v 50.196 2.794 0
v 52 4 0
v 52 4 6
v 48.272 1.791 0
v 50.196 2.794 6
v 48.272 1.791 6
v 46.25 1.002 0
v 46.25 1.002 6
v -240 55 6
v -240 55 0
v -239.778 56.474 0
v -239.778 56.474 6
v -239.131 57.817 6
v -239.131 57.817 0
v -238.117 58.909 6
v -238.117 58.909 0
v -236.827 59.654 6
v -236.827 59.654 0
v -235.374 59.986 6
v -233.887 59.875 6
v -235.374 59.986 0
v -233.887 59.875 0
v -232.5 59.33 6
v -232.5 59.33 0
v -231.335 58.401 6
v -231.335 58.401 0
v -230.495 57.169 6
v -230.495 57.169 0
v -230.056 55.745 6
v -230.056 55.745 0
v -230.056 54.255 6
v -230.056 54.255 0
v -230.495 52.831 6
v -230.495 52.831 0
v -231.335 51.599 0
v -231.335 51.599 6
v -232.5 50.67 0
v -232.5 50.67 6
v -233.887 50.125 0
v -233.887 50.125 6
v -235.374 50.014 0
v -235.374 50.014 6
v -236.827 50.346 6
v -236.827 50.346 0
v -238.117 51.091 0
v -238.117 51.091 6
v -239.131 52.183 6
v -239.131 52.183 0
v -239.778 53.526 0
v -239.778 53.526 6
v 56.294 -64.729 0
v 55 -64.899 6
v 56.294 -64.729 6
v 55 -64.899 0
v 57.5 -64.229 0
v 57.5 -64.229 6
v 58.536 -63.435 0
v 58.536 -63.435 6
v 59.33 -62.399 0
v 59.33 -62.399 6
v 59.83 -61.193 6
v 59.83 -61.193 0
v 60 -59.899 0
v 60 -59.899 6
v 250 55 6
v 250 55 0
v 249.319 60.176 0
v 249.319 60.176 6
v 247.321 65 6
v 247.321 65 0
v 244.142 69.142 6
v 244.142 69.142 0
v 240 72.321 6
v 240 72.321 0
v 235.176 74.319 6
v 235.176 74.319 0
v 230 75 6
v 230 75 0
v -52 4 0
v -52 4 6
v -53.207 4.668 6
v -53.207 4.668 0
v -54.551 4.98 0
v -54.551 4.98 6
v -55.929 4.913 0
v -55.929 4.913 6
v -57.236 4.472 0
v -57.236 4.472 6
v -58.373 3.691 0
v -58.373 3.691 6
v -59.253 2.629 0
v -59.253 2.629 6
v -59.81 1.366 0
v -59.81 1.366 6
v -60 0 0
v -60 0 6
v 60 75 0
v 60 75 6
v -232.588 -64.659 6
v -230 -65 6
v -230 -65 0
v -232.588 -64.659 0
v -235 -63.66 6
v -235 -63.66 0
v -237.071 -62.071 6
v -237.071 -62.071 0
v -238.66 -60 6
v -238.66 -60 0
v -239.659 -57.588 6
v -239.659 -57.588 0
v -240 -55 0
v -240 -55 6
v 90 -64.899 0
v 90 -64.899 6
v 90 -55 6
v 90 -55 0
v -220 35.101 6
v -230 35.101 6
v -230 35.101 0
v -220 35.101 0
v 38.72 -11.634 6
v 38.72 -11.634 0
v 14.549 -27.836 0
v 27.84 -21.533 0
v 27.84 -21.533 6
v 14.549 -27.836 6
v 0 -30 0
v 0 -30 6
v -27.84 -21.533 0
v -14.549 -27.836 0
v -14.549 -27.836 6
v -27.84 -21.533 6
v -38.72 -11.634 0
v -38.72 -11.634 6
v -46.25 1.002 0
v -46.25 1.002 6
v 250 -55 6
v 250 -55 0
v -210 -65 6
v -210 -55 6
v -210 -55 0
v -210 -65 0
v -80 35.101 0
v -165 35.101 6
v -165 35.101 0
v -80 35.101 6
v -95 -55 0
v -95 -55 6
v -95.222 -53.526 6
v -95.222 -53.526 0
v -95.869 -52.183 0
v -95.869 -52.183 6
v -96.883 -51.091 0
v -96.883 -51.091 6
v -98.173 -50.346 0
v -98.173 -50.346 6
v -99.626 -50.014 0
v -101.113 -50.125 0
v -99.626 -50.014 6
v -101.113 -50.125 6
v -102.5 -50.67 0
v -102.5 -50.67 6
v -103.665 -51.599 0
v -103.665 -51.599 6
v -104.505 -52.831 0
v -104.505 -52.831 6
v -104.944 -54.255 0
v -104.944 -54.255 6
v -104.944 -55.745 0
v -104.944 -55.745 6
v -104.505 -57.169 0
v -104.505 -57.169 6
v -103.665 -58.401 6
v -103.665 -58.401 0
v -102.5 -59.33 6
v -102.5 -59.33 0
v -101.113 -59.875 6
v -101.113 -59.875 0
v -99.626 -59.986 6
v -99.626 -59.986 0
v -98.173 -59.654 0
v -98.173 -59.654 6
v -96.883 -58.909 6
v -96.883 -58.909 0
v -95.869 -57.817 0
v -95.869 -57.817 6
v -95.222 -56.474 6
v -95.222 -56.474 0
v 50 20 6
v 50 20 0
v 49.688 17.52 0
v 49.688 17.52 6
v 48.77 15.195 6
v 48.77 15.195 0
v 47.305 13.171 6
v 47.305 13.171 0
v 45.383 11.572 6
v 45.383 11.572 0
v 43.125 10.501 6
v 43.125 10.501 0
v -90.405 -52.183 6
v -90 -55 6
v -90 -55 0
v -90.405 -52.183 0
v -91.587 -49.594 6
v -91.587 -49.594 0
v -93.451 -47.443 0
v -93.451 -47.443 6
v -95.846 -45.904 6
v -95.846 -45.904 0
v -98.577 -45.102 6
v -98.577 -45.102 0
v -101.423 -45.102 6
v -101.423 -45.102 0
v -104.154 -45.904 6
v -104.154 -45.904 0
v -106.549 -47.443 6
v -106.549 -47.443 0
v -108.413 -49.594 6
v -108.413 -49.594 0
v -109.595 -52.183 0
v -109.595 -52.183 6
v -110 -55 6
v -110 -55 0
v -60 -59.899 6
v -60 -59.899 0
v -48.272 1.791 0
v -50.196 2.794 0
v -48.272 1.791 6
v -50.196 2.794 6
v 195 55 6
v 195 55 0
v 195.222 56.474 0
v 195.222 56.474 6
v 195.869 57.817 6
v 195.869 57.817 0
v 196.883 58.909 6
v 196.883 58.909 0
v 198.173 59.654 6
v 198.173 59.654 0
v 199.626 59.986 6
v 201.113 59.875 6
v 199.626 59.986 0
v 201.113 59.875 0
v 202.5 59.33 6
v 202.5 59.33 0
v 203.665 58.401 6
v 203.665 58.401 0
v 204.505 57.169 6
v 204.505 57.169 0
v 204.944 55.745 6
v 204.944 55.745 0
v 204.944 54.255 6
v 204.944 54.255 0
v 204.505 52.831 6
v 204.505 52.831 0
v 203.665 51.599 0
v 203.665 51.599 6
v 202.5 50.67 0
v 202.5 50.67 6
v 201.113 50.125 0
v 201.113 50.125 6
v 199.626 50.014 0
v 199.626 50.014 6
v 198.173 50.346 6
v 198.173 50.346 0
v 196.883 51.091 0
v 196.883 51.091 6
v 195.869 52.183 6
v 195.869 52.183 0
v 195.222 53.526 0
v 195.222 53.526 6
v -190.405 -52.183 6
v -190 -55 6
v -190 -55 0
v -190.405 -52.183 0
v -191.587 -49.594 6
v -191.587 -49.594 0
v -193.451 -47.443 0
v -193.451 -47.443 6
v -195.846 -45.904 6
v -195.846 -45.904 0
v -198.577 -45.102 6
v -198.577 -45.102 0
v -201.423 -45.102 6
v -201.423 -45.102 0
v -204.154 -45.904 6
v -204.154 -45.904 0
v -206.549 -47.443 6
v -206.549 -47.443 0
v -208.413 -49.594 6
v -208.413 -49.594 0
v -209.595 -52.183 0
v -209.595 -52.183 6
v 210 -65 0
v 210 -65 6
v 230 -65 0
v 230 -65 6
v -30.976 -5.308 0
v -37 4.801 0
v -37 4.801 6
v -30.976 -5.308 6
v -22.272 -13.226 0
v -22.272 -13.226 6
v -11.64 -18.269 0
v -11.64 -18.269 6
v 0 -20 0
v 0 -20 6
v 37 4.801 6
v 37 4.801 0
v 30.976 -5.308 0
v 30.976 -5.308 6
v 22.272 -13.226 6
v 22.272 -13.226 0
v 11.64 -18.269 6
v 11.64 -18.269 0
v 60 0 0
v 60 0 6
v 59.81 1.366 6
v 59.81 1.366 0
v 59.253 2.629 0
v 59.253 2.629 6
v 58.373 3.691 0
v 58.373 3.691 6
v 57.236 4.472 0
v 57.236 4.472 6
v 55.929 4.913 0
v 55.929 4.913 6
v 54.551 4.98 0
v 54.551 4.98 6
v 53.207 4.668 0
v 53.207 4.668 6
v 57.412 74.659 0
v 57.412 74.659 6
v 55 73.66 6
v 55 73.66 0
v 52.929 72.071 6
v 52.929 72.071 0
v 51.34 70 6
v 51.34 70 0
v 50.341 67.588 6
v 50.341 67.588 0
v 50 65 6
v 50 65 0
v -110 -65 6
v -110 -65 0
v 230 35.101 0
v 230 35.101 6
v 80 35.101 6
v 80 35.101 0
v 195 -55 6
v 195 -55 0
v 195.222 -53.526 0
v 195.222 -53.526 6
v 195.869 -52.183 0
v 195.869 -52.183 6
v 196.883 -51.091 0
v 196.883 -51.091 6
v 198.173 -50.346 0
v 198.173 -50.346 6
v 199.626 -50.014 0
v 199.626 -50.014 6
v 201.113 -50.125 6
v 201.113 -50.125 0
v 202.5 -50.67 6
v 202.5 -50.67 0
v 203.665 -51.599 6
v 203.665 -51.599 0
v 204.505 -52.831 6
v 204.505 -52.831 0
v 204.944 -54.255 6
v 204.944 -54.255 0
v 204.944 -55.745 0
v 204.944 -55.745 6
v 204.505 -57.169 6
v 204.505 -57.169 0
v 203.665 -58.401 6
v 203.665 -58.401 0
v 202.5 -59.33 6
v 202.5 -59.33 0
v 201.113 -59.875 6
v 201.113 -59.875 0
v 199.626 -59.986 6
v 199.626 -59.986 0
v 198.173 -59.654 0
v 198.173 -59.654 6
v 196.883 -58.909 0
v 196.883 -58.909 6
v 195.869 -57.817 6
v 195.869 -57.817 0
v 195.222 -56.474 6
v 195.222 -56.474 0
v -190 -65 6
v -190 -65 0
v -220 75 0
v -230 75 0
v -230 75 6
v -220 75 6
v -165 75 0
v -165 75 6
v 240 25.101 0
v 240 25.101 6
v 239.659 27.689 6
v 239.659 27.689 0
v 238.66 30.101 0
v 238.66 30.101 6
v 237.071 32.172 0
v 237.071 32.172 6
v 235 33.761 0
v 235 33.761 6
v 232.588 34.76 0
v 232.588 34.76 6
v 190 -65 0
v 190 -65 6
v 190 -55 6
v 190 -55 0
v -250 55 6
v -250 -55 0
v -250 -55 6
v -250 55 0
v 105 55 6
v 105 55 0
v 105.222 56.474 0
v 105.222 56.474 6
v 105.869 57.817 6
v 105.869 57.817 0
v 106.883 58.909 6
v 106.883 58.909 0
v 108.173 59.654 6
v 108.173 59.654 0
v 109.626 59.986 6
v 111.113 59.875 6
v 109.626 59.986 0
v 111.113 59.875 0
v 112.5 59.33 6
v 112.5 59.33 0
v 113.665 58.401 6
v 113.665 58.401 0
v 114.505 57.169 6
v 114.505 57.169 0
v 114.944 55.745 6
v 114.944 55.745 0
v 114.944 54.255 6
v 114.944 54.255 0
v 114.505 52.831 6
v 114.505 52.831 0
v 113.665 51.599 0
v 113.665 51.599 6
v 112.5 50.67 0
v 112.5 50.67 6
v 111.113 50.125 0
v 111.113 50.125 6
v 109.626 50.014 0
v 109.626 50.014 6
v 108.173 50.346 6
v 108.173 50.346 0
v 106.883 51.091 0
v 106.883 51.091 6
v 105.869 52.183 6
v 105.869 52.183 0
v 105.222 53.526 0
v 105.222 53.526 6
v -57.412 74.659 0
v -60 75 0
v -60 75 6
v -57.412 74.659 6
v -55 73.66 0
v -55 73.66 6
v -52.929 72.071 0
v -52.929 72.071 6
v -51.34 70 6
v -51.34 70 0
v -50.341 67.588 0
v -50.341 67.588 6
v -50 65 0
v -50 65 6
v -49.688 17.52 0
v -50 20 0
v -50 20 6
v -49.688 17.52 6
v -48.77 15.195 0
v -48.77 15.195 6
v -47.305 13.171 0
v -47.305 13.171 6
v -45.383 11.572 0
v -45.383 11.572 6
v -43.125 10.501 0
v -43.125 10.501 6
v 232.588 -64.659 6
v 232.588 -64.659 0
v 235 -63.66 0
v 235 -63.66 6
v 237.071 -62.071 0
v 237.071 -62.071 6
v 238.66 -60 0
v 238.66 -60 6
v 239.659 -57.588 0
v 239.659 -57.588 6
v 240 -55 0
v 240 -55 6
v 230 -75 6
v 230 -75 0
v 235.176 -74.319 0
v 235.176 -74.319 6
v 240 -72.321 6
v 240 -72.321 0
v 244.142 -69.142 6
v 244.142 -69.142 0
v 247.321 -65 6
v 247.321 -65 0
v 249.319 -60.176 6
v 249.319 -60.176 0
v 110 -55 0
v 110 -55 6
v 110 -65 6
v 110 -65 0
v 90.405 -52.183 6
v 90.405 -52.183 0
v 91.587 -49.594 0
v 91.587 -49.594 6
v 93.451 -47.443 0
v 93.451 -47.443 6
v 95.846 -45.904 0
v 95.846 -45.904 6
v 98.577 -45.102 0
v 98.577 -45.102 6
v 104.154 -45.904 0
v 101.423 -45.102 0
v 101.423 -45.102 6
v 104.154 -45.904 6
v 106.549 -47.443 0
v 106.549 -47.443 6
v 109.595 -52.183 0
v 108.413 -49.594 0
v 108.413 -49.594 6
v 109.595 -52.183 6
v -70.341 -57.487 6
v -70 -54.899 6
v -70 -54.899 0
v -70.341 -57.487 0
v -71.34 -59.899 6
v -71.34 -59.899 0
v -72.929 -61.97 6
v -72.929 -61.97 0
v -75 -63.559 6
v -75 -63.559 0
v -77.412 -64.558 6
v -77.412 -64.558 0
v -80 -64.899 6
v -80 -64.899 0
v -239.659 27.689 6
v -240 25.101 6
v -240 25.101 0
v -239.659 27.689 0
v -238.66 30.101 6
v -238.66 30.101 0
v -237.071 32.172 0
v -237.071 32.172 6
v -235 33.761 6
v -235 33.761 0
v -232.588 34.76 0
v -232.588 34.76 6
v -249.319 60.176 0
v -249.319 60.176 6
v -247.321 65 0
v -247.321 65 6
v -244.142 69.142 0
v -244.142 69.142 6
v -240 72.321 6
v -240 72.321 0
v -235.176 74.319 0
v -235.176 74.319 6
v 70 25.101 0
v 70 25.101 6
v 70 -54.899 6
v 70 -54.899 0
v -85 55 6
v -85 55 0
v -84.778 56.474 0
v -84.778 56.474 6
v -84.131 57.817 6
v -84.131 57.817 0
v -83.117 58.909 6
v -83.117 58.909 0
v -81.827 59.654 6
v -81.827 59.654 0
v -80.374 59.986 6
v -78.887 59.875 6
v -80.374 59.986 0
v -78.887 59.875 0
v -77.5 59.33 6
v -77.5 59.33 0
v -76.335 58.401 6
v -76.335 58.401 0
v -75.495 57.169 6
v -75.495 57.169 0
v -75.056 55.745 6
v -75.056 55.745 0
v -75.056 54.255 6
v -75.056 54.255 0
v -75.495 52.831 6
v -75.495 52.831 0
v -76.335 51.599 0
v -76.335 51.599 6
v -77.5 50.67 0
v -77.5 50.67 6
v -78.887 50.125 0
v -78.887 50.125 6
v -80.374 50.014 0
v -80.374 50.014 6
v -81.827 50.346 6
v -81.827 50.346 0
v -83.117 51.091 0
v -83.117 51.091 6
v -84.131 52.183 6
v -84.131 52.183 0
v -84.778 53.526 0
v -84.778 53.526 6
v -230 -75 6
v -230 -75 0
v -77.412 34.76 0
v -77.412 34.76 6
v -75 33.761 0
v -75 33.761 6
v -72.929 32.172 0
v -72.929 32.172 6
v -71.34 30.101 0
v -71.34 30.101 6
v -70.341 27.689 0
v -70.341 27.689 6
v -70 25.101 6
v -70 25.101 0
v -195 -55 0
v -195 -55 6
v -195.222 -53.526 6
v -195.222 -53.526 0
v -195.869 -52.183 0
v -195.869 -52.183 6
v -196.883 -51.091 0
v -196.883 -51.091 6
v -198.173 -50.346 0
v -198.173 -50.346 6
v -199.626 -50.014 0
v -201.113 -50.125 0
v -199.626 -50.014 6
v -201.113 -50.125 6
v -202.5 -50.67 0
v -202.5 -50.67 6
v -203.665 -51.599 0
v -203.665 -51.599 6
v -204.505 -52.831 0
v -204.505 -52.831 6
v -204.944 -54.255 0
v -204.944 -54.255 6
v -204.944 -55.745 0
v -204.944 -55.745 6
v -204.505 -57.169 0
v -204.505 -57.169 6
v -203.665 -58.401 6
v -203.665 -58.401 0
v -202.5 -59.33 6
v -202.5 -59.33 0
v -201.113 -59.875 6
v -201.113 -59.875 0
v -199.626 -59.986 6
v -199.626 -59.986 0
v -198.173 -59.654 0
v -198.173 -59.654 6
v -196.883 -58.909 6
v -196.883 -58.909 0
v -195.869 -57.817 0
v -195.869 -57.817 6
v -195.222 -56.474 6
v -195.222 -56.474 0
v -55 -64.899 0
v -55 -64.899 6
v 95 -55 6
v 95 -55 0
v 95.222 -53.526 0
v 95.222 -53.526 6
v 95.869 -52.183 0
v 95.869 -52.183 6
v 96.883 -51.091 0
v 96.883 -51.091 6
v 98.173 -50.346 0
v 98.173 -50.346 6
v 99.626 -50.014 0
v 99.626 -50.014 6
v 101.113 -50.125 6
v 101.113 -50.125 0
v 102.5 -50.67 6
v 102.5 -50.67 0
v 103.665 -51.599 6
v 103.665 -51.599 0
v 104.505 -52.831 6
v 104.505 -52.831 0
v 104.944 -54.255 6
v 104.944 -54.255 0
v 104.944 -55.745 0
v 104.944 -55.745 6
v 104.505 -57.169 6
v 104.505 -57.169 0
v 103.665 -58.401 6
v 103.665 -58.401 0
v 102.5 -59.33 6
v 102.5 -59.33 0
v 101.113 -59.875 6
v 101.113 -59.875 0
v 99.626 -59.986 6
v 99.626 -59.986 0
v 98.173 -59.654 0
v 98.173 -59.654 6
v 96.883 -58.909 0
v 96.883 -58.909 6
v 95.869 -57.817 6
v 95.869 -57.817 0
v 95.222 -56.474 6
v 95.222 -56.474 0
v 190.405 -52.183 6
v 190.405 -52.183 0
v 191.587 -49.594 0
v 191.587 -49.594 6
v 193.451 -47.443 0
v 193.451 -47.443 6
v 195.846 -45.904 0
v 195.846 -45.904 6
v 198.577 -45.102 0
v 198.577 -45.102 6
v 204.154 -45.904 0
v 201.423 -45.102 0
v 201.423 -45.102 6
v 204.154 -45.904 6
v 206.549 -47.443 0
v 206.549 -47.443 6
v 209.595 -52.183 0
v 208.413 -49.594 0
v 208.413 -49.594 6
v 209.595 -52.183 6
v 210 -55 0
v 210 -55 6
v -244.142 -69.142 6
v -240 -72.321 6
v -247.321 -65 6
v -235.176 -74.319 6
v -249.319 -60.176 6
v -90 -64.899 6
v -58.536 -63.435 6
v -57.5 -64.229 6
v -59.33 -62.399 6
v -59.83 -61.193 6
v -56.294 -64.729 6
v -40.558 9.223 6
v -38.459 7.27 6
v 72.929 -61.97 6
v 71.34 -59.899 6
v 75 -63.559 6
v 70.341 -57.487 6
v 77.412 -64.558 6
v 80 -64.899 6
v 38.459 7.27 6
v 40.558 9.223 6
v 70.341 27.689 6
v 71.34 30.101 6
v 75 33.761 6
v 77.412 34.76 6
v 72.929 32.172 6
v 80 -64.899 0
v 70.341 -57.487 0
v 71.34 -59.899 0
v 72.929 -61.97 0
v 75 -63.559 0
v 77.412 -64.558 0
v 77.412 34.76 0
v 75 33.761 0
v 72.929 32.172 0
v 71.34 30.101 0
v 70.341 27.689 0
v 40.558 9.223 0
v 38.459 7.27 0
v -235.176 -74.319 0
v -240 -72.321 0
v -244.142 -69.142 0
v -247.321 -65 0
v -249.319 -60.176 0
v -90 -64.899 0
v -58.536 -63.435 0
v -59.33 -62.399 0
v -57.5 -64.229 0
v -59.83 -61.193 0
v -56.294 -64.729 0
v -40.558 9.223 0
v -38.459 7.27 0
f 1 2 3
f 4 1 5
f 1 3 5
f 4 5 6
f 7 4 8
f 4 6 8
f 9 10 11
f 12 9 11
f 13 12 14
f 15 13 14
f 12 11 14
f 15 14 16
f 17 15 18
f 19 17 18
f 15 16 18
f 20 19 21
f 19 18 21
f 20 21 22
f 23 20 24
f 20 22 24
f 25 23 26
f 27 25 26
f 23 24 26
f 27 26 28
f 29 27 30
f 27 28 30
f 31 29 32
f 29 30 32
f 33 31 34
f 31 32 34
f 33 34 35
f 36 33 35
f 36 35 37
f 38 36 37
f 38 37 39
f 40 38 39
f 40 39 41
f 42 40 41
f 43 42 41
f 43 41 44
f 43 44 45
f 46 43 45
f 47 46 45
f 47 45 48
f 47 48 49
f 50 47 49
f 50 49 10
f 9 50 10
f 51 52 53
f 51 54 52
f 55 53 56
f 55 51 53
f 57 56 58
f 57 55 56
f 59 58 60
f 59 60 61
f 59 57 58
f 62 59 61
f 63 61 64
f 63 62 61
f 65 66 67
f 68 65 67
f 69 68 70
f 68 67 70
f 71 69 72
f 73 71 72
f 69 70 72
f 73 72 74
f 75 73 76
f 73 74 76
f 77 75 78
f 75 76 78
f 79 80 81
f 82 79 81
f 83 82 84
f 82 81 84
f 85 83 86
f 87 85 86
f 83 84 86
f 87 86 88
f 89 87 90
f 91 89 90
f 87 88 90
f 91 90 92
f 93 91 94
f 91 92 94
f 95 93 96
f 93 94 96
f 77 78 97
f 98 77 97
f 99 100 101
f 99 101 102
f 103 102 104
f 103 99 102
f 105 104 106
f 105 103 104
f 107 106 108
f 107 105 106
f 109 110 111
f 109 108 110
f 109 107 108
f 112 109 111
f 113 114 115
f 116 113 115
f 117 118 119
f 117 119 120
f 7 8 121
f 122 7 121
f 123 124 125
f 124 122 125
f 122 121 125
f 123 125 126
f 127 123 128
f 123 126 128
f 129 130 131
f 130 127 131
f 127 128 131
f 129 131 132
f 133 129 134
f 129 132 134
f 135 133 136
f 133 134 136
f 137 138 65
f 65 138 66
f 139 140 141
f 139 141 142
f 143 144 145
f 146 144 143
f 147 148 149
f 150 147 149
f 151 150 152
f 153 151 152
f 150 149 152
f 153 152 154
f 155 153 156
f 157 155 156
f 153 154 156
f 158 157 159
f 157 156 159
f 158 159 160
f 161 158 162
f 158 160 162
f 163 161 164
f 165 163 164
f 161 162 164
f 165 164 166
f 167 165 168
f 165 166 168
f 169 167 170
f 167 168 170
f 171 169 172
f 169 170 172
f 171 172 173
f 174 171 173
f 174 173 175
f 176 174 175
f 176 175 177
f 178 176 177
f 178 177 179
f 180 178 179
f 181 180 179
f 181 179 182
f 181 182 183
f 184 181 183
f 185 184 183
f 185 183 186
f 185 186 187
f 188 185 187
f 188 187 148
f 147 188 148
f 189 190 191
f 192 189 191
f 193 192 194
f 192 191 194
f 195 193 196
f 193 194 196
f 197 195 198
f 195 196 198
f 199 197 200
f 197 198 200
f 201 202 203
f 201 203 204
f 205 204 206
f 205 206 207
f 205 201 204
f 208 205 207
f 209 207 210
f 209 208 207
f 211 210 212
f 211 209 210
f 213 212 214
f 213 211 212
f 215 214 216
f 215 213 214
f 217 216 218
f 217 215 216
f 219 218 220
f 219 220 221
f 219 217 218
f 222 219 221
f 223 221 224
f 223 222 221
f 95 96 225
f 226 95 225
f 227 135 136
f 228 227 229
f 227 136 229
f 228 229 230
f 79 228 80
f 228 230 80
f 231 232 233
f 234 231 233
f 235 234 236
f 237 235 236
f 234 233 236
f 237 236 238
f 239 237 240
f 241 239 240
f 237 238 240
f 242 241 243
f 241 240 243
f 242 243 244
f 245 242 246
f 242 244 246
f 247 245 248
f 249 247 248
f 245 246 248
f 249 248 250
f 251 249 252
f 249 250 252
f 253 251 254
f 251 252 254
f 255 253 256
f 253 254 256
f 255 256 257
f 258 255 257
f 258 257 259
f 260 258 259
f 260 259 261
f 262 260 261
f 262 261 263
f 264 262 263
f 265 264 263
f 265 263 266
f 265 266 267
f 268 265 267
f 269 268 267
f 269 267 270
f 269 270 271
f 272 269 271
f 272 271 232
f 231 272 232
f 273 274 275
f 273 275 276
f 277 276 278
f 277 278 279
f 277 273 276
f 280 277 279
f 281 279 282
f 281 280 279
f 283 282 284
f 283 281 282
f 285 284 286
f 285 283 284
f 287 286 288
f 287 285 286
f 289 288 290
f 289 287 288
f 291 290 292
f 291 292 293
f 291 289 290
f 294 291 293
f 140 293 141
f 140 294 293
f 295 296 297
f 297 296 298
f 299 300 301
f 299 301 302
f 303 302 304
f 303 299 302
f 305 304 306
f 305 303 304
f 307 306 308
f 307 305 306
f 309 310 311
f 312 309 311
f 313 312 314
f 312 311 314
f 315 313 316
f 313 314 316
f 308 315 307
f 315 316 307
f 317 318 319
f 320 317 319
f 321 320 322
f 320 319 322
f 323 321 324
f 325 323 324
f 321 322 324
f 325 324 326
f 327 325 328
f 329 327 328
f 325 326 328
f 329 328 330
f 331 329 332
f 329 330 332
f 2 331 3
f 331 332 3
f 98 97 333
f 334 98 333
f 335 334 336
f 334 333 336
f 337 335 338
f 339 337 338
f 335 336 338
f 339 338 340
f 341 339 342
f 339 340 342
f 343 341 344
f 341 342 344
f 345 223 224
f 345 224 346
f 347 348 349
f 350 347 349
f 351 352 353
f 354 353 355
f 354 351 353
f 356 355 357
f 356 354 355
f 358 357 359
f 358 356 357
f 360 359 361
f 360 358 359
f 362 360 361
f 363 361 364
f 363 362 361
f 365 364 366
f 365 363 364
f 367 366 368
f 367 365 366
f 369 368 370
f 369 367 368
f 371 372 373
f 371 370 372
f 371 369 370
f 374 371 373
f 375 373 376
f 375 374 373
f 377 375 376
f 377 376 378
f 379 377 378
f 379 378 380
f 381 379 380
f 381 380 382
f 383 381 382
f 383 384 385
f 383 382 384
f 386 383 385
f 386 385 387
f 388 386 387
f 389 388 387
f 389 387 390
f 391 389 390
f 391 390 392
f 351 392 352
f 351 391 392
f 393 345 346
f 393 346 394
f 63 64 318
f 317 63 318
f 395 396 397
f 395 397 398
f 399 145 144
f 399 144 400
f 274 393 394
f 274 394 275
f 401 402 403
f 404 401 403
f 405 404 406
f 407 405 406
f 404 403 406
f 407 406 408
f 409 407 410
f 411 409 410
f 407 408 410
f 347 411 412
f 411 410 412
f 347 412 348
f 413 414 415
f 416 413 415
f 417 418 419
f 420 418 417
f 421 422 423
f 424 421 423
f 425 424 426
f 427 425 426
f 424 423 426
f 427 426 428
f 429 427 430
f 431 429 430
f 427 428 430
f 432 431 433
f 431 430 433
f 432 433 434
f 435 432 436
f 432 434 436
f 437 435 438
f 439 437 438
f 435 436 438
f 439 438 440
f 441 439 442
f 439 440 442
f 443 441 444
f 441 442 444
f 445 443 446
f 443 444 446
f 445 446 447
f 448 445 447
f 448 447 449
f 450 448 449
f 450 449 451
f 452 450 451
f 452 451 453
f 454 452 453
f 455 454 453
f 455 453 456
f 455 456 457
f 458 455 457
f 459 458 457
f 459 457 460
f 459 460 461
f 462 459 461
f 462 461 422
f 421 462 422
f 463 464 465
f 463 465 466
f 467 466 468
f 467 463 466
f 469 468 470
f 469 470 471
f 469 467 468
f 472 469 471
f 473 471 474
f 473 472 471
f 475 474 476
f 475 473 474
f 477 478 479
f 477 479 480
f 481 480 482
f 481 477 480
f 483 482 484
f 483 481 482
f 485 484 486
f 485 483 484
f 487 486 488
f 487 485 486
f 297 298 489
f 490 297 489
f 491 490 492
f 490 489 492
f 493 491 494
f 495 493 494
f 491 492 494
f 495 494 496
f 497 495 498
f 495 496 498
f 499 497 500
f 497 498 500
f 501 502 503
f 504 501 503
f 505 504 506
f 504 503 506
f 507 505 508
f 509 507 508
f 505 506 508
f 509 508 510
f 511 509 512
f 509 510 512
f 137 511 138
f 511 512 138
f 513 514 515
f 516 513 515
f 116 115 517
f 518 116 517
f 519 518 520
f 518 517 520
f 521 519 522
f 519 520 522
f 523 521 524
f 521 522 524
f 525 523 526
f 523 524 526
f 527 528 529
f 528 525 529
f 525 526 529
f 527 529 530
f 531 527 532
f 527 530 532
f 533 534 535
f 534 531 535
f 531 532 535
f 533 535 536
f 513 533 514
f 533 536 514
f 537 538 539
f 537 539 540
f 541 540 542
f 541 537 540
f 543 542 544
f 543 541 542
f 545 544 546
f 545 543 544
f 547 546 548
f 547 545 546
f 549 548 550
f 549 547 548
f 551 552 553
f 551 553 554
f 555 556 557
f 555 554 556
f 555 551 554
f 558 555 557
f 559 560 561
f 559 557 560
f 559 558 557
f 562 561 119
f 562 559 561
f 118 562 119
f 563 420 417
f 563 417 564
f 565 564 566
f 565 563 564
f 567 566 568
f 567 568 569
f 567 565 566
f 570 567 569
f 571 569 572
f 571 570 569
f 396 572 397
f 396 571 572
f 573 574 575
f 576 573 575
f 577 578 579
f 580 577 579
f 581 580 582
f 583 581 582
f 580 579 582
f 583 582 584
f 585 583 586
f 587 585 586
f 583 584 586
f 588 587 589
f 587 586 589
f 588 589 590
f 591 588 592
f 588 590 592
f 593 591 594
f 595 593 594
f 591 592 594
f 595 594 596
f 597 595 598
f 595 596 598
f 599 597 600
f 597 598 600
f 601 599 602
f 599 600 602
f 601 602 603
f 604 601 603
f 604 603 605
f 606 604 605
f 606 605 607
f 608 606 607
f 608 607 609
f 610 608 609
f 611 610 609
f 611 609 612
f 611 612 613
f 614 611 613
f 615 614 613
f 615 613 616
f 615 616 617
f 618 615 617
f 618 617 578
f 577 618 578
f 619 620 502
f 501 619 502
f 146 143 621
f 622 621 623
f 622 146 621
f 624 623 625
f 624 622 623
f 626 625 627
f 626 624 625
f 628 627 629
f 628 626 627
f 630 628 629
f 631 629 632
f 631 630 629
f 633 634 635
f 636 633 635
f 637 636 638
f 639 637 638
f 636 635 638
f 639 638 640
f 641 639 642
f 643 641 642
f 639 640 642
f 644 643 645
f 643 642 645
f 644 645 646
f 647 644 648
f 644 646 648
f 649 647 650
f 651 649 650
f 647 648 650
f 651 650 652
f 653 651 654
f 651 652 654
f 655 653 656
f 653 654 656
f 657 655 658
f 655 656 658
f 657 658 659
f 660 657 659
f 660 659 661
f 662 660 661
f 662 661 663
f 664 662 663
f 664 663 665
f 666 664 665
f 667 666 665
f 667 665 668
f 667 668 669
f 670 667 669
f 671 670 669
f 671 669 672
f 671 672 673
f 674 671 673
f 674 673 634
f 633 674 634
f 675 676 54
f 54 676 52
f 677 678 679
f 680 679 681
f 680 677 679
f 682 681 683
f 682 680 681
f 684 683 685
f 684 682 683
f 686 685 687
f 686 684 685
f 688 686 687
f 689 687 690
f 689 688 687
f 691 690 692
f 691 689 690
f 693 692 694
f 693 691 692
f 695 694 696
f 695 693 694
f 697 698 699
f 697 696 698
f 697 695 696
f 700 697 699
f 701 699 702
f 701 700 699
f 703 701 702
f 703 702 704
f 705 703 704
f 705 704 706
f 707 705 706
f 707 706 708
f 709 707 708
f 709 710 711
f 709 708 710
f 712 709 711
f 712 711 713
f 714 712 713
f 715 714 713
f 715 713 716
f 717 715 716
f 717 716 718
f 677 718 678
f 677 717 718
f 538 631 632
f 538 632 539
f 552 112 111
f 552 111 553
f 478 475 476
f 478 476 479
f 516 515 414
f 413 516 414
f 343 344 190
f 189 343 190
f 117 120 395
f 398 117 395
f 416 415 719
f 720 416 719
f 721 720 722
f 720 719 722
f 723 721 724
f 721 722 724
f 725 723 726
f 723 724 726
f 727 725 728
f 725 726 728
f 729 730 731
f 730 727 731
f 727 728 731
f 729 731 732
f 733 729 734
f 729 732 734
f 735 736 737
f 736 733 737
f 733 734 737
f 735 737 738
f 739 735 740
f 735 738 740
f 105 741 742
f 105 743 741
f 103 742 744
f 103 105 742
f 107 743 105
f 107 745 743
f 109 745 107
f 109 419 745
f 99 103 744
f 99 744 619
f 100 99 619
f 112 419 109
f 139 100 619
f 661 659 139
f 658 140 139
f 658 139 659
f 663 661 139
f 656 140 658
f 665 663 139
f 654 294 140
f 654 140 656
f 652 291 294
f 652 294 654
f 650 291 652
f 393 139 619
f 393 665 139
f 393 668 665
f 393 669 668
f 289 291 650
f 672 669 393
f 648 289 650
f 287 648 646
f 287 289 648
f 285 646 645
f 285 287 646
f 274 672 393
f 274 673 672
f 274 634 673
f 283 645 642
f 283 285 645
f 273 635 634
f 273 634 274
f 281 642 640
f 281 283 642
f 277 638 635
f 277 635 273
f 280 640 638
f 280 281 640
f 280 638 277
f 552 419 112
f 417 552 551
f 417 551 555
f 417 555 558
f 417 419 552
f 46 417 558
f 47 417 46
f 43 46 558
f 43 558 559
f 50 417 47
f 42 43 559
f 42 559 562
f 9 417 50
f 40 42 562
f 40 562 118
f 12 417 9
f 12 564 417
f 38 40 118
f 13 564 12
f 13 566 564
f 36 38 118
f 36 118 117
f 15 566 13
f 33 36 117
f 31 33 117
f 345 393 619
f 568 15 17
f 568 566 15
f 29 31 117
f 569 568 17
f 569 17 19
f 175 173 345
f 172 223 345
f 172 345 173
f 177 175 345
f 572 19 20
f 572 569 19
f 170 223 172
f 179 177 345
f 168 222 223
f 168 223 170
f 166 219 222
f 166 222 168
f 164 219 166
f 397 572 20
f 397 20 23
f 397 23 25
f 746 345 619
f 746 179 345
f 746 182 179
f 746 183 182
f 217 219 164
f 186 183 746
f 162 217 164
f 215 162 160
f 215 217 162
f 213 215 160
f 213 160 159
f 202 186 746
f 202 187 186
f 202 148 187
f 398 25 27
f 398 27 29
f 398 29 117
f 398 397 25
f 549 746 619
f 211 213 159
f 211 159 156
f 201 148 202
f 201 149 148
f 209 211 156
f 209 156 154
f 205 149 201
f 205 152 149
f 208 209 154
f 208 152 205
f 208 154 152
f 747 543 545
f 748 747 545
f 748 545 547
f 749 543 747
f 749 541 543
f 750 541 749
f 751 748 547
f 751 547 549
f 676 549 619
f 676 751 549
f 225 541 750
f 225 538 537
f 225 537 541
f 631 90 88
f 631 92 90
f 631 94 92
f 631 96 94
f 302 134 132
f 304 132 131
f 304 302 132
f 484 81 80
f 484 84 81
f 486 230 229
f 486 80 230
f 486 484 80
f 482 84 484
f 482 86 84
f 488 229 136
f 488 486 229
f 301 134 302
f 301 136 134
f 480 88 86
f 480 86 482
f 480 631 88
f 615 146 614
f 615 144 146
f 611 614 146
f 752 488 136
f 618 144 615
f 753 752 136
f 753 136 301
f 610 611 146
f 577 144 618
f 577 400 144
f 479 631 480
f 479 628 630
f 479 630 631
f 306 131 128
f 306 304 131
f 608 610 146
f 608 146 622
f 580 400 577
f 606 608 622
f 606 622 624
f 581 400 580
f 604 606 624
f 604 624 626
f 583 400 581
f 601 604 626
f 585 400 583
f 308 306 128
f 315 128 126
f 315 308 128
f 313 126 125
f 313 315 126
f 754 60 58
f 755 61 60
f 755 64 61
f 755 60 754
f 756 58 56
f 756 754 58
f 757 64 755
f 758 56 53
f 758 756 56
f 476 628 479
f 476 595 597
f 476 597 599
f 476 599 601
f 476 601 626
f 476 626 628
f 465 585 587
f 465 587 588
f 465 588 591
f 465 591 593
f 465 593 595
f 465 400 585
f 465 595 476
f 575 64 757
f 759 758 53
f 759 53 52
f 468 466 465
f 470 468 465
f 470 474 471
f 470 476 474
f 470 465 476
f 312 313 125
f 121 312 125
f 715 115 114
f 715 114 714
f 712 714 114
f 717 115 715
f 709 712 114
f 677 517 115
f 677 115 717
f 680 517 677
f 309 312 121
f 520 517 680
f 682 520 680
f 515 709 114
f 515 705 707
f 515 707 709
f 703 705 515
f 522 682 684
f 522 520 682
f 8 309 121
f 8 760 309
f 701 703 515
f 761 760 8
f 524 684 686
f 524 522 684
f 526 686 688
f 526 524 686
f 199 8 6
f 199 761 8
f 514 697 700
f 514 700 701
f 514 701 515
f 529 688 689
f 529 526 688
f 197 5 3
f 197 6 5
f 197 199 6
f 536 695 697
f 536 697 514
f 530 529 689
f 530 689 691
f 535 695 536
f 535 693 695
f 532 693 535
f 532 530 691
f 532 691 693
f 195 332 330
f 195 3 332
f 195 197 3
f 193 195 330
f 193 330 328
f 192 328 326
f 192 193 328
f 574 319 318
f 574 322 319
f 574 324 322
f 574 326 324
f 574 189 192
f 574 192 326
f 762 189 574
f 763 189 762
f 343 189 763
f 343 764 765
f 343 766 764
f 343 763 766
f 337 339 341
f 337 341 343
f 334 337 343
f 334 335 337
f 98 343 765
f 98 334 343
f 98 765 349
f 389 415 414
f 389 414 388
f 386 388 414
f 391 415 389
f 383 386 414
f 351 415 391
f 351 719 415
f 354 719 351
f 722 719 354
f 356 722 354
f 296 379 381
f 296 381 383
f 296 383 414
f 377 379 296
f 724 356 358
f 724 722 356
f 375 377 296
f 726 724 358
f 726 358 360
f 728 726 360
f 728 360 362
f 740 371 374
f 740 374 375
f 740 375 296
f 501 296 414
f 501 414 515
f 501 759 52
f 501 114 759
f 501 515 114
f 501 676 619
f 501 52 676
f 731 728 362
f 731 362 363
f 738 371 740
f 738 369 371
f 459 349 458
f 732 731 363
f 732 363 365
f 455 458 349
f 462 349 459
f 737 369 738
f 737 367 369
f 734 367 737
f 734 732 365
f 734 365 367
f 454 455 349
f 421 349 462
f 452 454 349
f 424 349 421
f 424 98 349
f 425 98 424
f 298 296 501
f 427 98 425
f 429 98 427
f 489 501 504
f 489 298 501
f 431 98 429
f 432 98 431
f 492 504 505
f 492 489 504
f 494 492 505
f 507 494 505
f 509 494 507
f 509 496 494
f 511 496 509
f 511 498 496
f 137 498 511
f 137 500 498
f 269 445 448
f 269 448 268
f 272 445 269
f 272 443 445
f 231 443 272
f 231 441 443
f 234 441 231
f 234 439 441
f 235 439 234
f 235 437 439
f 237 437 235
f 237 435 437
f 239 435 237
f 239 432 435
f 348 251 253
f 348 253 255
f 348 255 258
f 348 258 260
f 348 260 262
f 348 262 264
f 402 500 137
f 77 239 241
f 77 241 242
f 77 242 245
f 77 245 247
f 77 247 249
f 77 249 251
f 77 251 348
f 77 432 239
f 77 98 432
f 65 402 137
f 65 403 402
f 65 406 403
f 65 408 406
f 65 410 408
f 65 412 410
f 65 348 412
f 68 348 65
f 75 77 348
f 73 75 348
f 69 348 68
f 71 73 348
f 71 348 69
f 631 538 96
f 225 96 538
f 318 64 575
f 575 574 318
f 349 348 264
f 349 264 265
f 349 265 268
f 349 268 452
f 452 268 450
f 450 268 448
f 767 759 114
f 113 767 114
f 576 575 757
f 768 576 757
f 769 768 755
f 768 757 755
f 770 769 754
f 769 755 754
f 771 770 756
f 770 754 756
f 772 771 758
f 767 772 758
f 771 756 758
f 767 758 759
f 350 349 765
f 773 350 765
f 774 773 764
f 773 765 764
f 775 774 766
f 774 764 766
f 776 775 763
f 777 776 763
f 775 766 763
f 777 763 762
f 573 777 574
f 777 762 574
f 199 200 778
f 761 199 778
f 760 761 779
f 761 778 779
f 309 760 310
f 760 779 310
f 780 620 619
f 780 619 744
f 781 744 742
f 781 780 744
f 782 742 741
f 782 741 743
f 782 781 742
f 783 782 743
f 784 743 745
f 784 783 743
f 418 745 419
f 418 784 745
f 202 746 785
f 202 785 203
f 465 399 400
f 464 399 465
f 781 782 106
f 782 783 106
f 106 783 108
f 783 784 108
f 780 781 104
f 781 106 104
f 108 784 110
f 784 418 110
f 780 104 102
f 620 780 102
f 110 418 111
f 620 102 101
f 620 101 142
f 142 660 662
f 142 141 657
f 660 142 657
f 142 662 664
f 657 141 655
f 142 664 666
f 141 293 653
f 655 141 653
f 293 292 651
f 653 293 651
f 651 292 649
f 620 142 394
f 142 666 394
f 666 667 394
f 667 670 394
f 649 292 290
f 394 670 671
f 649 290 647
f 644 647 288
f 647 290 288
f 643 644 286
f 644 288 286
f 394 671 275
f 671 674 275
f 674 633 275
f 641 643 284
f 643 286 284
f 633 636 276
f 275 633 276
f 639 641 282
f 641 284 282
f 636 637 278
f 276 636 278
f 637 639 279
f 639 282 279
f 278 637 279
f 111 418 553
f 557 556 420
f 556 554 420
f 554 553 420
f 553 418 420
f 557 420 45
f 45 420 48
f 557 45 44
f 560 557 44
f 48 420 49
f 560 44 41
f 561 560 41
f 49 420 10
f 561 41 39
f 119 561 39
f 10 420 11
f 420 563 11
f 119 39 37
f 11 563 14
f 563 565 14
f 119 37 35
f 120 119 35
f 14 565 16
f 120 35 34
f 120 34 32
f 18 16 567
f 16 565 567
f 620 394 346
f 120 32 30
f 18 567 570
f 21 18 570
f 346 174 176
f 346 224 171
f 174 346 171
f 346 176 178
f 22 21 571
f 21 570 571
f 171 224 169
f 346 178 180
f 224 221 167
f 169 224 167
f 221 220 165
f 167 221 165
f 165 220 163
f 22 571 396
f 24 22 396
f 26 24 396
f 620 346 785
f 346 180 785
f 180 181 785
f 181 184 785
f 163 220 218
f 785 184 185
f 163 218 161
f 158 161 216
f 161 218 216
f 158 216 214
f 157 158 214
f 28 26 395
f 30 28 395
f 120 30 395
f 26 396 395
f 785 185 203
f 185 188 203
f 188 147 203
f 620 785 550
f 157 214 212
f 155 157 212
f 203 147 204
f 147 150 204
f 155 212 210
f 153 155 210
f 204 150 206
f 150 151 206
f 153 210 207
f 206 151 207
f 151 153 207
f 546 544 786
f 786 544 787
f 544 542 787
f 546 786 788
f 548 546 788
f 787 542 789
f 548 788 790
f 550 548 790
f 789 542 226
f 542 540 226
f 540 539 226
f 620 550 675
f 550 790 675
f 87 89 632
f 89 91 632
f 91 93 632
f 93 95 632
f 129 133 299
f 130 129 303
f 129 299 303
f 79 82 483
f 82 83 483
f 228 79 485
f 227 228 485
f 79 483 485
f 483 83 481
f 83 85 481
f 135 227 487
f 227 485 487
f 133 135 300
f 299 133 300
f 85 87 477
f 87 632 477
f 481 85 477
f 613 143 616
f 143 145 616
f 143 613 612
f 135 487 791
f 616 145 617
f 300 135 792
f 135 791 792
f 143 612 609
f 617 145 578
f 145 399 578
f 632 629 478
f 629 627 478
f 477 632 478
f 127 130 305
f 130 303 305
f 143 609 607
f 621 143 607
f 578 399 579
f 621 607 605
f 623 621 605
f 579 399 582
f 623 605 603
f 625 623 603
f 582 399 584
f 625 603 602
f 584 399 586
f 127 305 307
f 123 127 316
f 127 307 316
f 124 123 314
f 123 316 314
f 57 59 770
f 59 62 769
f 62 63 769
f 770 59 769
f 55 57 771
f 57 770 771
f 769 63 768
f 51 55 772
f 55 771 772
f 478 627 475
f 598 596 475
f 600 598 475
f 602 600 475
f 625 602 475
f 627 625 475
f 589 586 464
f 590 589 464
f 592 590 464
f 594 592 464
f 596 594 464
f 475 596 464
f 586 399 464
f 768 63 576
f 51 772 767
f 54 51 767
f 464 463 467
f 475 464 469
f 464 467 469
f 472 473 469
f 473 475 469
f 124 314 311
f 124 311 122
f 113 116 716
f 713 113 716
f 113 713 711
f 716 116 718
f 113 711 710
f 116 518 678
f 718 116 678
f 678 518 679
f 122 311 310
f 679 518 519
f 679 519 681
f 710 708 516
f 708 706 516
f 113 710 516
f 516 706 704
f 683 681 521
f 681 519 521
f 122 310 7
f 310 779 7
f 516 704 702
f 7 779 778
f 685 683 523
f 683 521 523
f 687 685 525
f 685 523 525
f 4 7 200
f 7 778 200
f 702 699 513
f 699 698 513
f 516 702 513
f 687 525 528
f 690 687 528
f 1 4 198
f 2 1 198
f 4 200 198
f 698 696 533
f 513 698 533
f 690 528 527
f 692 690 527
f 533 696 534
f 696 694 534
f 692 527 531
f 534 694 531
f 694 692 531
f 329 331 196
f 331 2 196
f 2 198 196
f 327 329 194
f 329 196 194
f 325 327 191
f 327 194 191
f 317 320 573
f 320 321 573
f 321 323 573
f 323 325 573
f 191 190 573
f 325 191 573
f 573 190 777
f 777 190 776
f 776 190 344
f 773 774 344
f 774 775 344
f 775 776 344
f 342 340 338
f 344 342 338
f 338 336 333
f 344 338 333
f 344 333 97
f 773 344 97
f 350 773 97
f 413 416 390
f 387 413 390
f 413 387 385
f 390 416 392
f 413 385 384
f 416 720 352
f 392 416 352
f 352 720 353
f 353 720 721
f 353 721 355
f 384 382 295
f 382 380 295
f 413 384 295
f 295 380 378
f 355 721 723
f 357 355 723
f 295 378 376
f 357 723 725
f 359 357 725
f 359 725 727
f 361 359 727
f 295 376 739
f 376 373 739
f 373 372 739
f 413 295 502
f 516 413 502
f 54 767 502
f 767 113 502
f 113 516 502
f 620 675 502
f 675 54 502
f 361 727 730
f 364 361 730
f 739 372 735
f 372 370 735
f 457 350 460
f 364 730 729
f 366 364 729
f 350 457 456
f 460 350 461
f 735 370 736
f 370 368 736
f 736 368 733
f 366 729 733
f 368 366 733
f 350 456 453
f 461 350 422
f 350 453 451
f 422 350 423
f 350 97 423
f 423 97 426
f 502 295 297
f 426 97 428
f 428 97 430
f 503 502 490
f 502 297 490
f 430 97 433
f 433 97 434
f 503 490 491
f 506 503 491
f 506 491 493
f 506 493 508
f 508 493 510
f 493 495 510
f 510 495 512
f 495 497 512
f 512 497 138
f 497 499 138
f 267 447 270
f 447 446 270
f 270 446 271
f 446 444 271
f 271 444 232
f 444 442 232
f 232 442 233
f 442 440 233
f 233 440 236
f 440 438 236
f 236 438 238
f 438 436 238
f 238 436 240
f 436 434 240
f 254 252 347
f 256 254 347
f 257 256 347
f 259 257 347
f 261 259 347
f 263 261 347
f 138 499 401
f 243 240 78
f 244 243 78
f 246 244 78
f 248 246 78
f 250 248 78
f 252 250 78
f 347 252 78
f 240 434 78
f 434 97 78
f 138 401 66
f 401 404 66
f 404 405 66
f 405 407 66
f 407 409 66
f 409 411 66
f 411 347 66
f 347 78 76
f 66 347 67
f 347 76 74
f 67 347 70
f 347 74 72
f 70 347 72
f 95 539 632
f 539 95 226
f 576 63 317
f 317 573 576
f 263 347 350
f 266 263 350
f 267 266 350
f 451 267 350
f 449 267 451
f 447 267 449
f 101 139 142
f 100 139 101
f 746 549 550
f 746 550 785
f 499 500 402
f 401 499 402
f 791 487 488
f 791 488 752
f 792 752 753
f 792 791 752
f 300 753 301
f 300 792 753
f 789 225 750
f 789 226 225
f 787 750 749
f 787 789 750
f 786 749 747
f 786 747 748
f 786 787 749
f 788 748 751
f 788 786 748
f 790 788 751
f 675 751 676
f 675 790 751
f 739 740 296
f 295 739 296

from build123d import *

# Parameters (mm, degrees)
BOSS_EXTRUDE1_DEPTH = 6
SKETCH4_R           = 5
CUT_EXTRUDE2_DEPTH  = 262.076617107
CUT_EXTRUDE5_DEPTH  = 262.076617107
FILLET5_R           = 5
FILLET6_R           = 5
SKETCH9_R           = 5
SKETCH9_W           = 55
SKETCH9_H           = 39.899020921
CUT_EXTRUDE6_DEPTH  = 262.076617107


with BuildPart() as part:
    # Sketch1 → Boss-Extrude1 (new body)
    with BuildSketch(Plane.XY):
        with BuildLine():
            Line((-250, -55), (-250, 3.178280867))
            Line((-250, 3.178280867), (-250, 55))
            ThreePointArc((-250, 55), (-244.142135624, 69.142135624), (-230, 75))
            Line((-230, 75), (-220, 75))
            Line((-220, 75), (-164.330865428, 75))
            Line((-164.330865428, 75), (-60, 75))
            ThreePointArc((-60, 75), (-52.928932188, 72.071067812), (-50, 65))
            Line((-50, 65), (-50, 20))
            ThreePointArc((-50, 20), (-48.100925873, 14.1369803), (-43.125, 10.500822404))
            ThreePointArc((-43.125, 10.500822404), (-39.437786703, 8.32242004), (-37, 4.801315846))
            ThreePointArc((-37, 4.801315846), (-22.271648276, -13.226099426), (0, -20))
            Line((0, -20), (0, -40))
            Line((0, -40), (0, -65))
            Line((0, -65), (0, -75))
            Line((0, -75), (-230, -75))
            ThreePointArc((-230, -75), (-244.142135624, -69.142135624), (-250, -55))
        make_face()
    boss_extrude1 = extrude(amount=BOSS_EXTRUDE1_DEPTH)

    # Mirror1: Boss-Extrude1 across plane
    add(boss_extrude1.mirror(Plane(origin=(0, -20, 6), x_dir=(0, 0, 1), z_dir=(-1, 0, 0))))

    # Sketch4 → Cut-Extrude2 (cut, through all)
    with BuildSketch(Plane.XY.offset(6)):
        with Locations((-200, -55)):
            Circle(SKETCH4_R)
        with Locations((-100, -55)):
            Circle(SKETCH4_R)
        with BuildLine():
            Line((-70, 25.100979079), (-70, -54.899020921))
            ThreePointArc((-70, -54.899020921), (-72.928932188, -61.970088733), (-80, -64.899020921))
            Line((-80, -64.899020921), (-90, -64.899020921))
            Line((-90, -64.899020921), (-90, -55))
            ThreePointArc((-90, -55), (-100, -45), (-110, -55))
            Line((-110, -55), (-110, -65))
            Line((-110, -65), (-190, -65))
            Line((-190, -65), (-190, -55))
            ThreePointArc((-190, -55), (-200, -45), (-210, -55))
            Line((-210, -55), (-210, -65))
            Line((-210, -65), (-230, -65))
            ThreePointArc((-230, -65), (-237.071067812, -62.071067812), (-240, -55))
            Line((-240, -55), (-240, 25.100979079))
            ThreePointArc((-240, 25.100979079), (-237.071067812, 32.17204689), (-230, 35.100979079))
            Line((-230, 35.100979079), (-140, 35.100979079))
            Line((-140, 35.100979079), (-110, 35.100979079))
            Line((-110, 35.100979079), (-80, 35.100979079))
            ThreePointArc((-80, 35.100979079), (-72.928932188, 32.17204689), (-70, 25.100979079))
        make_face()
    cut_extrude2 = extrude(amount=-CUT_EXTRUDE2_DEPTH, mode=Mode.SUBTRACT)

    # Mirror2: Cut-Extrude2 across plane
    add(cut_extrude2.mirror(Plane(origin=(0, 0, 0), x_dir=(0, 0, 1), z_dir=(1, 0, 0))), mode=Mode.SUBTRACT)

    # Sketch8 → Cut-Extrude5 (cut, through all)
    with BuildSketch(Plane.XY.offset(6)):
        with BuildLine():
            Line((-60, 0), (-60, -64.899020921))
            Line((-60, -64.899020921), (60, -64.899020921))
            Line((60, -64.899020921), (60, 0))
            ThreePointArc((60, 0), (57.236067977, 4.472135955), (52, 4))
            ThreePointArc((52, 4), (49.247332505, 2.266223145), (46.25, 1.001644808))
            ThreePointArc((46.25, 1.001644808), (0, -30), (-46.25, 1.001644808))
            ThreePointArc((-46.25, 1.001644808), (-49.247332505, 2.266223145), (-52, 4))
            ThreePointArc((-52, 4), (-57.236067977, 4.472135955), (-60, 0))
        make_face()
    extrude(amount=-CUT_EXTRUDE5_DEPTH, mode=Mode.SUBTRACT)

    # Fillet5
    fillet5_edges = [part.edges().sort_by_distance(p)[0] for p in [
        (-60, -64.899020921, 3),
    ]]
    fillet(fillet5_edges, radius=FILLET5_R)

    # Fillet6
    fillet6_edges = [part.edges().sort_by_distance(p)[0] for p in [
        (60, -64.899020921, 3),
    ]]
    fillet(fillet6_edges, radius=FILLET6_R)

    # Sketch9 → Cut-Extrude6 (cut, through all)
    with BuildSketch(Plane(origin=(0, 0, 0), x_dir=(-1, 0, 0), z_dir=(0, 0, -1))):
        with Locations((-200, 55)):
            Circle(SKETCH9_R)
        with Locations((-110, 55)):
            Circle(SKETCH9_R)
        with Locations((80, 55)):
            Circle(SKETCH9_R)
        with Locations((235, 55)):
            Circle(SKETCH9_R)
        with Locations((192.5, 55.05048954)):
            Rectangle(SKETCH9_W, SKETCH9_H)
    extrude(amount=-CUT_EXTRUDE6_DEPTH, mode=Mode.SUBTRACT)


solid = part.part
